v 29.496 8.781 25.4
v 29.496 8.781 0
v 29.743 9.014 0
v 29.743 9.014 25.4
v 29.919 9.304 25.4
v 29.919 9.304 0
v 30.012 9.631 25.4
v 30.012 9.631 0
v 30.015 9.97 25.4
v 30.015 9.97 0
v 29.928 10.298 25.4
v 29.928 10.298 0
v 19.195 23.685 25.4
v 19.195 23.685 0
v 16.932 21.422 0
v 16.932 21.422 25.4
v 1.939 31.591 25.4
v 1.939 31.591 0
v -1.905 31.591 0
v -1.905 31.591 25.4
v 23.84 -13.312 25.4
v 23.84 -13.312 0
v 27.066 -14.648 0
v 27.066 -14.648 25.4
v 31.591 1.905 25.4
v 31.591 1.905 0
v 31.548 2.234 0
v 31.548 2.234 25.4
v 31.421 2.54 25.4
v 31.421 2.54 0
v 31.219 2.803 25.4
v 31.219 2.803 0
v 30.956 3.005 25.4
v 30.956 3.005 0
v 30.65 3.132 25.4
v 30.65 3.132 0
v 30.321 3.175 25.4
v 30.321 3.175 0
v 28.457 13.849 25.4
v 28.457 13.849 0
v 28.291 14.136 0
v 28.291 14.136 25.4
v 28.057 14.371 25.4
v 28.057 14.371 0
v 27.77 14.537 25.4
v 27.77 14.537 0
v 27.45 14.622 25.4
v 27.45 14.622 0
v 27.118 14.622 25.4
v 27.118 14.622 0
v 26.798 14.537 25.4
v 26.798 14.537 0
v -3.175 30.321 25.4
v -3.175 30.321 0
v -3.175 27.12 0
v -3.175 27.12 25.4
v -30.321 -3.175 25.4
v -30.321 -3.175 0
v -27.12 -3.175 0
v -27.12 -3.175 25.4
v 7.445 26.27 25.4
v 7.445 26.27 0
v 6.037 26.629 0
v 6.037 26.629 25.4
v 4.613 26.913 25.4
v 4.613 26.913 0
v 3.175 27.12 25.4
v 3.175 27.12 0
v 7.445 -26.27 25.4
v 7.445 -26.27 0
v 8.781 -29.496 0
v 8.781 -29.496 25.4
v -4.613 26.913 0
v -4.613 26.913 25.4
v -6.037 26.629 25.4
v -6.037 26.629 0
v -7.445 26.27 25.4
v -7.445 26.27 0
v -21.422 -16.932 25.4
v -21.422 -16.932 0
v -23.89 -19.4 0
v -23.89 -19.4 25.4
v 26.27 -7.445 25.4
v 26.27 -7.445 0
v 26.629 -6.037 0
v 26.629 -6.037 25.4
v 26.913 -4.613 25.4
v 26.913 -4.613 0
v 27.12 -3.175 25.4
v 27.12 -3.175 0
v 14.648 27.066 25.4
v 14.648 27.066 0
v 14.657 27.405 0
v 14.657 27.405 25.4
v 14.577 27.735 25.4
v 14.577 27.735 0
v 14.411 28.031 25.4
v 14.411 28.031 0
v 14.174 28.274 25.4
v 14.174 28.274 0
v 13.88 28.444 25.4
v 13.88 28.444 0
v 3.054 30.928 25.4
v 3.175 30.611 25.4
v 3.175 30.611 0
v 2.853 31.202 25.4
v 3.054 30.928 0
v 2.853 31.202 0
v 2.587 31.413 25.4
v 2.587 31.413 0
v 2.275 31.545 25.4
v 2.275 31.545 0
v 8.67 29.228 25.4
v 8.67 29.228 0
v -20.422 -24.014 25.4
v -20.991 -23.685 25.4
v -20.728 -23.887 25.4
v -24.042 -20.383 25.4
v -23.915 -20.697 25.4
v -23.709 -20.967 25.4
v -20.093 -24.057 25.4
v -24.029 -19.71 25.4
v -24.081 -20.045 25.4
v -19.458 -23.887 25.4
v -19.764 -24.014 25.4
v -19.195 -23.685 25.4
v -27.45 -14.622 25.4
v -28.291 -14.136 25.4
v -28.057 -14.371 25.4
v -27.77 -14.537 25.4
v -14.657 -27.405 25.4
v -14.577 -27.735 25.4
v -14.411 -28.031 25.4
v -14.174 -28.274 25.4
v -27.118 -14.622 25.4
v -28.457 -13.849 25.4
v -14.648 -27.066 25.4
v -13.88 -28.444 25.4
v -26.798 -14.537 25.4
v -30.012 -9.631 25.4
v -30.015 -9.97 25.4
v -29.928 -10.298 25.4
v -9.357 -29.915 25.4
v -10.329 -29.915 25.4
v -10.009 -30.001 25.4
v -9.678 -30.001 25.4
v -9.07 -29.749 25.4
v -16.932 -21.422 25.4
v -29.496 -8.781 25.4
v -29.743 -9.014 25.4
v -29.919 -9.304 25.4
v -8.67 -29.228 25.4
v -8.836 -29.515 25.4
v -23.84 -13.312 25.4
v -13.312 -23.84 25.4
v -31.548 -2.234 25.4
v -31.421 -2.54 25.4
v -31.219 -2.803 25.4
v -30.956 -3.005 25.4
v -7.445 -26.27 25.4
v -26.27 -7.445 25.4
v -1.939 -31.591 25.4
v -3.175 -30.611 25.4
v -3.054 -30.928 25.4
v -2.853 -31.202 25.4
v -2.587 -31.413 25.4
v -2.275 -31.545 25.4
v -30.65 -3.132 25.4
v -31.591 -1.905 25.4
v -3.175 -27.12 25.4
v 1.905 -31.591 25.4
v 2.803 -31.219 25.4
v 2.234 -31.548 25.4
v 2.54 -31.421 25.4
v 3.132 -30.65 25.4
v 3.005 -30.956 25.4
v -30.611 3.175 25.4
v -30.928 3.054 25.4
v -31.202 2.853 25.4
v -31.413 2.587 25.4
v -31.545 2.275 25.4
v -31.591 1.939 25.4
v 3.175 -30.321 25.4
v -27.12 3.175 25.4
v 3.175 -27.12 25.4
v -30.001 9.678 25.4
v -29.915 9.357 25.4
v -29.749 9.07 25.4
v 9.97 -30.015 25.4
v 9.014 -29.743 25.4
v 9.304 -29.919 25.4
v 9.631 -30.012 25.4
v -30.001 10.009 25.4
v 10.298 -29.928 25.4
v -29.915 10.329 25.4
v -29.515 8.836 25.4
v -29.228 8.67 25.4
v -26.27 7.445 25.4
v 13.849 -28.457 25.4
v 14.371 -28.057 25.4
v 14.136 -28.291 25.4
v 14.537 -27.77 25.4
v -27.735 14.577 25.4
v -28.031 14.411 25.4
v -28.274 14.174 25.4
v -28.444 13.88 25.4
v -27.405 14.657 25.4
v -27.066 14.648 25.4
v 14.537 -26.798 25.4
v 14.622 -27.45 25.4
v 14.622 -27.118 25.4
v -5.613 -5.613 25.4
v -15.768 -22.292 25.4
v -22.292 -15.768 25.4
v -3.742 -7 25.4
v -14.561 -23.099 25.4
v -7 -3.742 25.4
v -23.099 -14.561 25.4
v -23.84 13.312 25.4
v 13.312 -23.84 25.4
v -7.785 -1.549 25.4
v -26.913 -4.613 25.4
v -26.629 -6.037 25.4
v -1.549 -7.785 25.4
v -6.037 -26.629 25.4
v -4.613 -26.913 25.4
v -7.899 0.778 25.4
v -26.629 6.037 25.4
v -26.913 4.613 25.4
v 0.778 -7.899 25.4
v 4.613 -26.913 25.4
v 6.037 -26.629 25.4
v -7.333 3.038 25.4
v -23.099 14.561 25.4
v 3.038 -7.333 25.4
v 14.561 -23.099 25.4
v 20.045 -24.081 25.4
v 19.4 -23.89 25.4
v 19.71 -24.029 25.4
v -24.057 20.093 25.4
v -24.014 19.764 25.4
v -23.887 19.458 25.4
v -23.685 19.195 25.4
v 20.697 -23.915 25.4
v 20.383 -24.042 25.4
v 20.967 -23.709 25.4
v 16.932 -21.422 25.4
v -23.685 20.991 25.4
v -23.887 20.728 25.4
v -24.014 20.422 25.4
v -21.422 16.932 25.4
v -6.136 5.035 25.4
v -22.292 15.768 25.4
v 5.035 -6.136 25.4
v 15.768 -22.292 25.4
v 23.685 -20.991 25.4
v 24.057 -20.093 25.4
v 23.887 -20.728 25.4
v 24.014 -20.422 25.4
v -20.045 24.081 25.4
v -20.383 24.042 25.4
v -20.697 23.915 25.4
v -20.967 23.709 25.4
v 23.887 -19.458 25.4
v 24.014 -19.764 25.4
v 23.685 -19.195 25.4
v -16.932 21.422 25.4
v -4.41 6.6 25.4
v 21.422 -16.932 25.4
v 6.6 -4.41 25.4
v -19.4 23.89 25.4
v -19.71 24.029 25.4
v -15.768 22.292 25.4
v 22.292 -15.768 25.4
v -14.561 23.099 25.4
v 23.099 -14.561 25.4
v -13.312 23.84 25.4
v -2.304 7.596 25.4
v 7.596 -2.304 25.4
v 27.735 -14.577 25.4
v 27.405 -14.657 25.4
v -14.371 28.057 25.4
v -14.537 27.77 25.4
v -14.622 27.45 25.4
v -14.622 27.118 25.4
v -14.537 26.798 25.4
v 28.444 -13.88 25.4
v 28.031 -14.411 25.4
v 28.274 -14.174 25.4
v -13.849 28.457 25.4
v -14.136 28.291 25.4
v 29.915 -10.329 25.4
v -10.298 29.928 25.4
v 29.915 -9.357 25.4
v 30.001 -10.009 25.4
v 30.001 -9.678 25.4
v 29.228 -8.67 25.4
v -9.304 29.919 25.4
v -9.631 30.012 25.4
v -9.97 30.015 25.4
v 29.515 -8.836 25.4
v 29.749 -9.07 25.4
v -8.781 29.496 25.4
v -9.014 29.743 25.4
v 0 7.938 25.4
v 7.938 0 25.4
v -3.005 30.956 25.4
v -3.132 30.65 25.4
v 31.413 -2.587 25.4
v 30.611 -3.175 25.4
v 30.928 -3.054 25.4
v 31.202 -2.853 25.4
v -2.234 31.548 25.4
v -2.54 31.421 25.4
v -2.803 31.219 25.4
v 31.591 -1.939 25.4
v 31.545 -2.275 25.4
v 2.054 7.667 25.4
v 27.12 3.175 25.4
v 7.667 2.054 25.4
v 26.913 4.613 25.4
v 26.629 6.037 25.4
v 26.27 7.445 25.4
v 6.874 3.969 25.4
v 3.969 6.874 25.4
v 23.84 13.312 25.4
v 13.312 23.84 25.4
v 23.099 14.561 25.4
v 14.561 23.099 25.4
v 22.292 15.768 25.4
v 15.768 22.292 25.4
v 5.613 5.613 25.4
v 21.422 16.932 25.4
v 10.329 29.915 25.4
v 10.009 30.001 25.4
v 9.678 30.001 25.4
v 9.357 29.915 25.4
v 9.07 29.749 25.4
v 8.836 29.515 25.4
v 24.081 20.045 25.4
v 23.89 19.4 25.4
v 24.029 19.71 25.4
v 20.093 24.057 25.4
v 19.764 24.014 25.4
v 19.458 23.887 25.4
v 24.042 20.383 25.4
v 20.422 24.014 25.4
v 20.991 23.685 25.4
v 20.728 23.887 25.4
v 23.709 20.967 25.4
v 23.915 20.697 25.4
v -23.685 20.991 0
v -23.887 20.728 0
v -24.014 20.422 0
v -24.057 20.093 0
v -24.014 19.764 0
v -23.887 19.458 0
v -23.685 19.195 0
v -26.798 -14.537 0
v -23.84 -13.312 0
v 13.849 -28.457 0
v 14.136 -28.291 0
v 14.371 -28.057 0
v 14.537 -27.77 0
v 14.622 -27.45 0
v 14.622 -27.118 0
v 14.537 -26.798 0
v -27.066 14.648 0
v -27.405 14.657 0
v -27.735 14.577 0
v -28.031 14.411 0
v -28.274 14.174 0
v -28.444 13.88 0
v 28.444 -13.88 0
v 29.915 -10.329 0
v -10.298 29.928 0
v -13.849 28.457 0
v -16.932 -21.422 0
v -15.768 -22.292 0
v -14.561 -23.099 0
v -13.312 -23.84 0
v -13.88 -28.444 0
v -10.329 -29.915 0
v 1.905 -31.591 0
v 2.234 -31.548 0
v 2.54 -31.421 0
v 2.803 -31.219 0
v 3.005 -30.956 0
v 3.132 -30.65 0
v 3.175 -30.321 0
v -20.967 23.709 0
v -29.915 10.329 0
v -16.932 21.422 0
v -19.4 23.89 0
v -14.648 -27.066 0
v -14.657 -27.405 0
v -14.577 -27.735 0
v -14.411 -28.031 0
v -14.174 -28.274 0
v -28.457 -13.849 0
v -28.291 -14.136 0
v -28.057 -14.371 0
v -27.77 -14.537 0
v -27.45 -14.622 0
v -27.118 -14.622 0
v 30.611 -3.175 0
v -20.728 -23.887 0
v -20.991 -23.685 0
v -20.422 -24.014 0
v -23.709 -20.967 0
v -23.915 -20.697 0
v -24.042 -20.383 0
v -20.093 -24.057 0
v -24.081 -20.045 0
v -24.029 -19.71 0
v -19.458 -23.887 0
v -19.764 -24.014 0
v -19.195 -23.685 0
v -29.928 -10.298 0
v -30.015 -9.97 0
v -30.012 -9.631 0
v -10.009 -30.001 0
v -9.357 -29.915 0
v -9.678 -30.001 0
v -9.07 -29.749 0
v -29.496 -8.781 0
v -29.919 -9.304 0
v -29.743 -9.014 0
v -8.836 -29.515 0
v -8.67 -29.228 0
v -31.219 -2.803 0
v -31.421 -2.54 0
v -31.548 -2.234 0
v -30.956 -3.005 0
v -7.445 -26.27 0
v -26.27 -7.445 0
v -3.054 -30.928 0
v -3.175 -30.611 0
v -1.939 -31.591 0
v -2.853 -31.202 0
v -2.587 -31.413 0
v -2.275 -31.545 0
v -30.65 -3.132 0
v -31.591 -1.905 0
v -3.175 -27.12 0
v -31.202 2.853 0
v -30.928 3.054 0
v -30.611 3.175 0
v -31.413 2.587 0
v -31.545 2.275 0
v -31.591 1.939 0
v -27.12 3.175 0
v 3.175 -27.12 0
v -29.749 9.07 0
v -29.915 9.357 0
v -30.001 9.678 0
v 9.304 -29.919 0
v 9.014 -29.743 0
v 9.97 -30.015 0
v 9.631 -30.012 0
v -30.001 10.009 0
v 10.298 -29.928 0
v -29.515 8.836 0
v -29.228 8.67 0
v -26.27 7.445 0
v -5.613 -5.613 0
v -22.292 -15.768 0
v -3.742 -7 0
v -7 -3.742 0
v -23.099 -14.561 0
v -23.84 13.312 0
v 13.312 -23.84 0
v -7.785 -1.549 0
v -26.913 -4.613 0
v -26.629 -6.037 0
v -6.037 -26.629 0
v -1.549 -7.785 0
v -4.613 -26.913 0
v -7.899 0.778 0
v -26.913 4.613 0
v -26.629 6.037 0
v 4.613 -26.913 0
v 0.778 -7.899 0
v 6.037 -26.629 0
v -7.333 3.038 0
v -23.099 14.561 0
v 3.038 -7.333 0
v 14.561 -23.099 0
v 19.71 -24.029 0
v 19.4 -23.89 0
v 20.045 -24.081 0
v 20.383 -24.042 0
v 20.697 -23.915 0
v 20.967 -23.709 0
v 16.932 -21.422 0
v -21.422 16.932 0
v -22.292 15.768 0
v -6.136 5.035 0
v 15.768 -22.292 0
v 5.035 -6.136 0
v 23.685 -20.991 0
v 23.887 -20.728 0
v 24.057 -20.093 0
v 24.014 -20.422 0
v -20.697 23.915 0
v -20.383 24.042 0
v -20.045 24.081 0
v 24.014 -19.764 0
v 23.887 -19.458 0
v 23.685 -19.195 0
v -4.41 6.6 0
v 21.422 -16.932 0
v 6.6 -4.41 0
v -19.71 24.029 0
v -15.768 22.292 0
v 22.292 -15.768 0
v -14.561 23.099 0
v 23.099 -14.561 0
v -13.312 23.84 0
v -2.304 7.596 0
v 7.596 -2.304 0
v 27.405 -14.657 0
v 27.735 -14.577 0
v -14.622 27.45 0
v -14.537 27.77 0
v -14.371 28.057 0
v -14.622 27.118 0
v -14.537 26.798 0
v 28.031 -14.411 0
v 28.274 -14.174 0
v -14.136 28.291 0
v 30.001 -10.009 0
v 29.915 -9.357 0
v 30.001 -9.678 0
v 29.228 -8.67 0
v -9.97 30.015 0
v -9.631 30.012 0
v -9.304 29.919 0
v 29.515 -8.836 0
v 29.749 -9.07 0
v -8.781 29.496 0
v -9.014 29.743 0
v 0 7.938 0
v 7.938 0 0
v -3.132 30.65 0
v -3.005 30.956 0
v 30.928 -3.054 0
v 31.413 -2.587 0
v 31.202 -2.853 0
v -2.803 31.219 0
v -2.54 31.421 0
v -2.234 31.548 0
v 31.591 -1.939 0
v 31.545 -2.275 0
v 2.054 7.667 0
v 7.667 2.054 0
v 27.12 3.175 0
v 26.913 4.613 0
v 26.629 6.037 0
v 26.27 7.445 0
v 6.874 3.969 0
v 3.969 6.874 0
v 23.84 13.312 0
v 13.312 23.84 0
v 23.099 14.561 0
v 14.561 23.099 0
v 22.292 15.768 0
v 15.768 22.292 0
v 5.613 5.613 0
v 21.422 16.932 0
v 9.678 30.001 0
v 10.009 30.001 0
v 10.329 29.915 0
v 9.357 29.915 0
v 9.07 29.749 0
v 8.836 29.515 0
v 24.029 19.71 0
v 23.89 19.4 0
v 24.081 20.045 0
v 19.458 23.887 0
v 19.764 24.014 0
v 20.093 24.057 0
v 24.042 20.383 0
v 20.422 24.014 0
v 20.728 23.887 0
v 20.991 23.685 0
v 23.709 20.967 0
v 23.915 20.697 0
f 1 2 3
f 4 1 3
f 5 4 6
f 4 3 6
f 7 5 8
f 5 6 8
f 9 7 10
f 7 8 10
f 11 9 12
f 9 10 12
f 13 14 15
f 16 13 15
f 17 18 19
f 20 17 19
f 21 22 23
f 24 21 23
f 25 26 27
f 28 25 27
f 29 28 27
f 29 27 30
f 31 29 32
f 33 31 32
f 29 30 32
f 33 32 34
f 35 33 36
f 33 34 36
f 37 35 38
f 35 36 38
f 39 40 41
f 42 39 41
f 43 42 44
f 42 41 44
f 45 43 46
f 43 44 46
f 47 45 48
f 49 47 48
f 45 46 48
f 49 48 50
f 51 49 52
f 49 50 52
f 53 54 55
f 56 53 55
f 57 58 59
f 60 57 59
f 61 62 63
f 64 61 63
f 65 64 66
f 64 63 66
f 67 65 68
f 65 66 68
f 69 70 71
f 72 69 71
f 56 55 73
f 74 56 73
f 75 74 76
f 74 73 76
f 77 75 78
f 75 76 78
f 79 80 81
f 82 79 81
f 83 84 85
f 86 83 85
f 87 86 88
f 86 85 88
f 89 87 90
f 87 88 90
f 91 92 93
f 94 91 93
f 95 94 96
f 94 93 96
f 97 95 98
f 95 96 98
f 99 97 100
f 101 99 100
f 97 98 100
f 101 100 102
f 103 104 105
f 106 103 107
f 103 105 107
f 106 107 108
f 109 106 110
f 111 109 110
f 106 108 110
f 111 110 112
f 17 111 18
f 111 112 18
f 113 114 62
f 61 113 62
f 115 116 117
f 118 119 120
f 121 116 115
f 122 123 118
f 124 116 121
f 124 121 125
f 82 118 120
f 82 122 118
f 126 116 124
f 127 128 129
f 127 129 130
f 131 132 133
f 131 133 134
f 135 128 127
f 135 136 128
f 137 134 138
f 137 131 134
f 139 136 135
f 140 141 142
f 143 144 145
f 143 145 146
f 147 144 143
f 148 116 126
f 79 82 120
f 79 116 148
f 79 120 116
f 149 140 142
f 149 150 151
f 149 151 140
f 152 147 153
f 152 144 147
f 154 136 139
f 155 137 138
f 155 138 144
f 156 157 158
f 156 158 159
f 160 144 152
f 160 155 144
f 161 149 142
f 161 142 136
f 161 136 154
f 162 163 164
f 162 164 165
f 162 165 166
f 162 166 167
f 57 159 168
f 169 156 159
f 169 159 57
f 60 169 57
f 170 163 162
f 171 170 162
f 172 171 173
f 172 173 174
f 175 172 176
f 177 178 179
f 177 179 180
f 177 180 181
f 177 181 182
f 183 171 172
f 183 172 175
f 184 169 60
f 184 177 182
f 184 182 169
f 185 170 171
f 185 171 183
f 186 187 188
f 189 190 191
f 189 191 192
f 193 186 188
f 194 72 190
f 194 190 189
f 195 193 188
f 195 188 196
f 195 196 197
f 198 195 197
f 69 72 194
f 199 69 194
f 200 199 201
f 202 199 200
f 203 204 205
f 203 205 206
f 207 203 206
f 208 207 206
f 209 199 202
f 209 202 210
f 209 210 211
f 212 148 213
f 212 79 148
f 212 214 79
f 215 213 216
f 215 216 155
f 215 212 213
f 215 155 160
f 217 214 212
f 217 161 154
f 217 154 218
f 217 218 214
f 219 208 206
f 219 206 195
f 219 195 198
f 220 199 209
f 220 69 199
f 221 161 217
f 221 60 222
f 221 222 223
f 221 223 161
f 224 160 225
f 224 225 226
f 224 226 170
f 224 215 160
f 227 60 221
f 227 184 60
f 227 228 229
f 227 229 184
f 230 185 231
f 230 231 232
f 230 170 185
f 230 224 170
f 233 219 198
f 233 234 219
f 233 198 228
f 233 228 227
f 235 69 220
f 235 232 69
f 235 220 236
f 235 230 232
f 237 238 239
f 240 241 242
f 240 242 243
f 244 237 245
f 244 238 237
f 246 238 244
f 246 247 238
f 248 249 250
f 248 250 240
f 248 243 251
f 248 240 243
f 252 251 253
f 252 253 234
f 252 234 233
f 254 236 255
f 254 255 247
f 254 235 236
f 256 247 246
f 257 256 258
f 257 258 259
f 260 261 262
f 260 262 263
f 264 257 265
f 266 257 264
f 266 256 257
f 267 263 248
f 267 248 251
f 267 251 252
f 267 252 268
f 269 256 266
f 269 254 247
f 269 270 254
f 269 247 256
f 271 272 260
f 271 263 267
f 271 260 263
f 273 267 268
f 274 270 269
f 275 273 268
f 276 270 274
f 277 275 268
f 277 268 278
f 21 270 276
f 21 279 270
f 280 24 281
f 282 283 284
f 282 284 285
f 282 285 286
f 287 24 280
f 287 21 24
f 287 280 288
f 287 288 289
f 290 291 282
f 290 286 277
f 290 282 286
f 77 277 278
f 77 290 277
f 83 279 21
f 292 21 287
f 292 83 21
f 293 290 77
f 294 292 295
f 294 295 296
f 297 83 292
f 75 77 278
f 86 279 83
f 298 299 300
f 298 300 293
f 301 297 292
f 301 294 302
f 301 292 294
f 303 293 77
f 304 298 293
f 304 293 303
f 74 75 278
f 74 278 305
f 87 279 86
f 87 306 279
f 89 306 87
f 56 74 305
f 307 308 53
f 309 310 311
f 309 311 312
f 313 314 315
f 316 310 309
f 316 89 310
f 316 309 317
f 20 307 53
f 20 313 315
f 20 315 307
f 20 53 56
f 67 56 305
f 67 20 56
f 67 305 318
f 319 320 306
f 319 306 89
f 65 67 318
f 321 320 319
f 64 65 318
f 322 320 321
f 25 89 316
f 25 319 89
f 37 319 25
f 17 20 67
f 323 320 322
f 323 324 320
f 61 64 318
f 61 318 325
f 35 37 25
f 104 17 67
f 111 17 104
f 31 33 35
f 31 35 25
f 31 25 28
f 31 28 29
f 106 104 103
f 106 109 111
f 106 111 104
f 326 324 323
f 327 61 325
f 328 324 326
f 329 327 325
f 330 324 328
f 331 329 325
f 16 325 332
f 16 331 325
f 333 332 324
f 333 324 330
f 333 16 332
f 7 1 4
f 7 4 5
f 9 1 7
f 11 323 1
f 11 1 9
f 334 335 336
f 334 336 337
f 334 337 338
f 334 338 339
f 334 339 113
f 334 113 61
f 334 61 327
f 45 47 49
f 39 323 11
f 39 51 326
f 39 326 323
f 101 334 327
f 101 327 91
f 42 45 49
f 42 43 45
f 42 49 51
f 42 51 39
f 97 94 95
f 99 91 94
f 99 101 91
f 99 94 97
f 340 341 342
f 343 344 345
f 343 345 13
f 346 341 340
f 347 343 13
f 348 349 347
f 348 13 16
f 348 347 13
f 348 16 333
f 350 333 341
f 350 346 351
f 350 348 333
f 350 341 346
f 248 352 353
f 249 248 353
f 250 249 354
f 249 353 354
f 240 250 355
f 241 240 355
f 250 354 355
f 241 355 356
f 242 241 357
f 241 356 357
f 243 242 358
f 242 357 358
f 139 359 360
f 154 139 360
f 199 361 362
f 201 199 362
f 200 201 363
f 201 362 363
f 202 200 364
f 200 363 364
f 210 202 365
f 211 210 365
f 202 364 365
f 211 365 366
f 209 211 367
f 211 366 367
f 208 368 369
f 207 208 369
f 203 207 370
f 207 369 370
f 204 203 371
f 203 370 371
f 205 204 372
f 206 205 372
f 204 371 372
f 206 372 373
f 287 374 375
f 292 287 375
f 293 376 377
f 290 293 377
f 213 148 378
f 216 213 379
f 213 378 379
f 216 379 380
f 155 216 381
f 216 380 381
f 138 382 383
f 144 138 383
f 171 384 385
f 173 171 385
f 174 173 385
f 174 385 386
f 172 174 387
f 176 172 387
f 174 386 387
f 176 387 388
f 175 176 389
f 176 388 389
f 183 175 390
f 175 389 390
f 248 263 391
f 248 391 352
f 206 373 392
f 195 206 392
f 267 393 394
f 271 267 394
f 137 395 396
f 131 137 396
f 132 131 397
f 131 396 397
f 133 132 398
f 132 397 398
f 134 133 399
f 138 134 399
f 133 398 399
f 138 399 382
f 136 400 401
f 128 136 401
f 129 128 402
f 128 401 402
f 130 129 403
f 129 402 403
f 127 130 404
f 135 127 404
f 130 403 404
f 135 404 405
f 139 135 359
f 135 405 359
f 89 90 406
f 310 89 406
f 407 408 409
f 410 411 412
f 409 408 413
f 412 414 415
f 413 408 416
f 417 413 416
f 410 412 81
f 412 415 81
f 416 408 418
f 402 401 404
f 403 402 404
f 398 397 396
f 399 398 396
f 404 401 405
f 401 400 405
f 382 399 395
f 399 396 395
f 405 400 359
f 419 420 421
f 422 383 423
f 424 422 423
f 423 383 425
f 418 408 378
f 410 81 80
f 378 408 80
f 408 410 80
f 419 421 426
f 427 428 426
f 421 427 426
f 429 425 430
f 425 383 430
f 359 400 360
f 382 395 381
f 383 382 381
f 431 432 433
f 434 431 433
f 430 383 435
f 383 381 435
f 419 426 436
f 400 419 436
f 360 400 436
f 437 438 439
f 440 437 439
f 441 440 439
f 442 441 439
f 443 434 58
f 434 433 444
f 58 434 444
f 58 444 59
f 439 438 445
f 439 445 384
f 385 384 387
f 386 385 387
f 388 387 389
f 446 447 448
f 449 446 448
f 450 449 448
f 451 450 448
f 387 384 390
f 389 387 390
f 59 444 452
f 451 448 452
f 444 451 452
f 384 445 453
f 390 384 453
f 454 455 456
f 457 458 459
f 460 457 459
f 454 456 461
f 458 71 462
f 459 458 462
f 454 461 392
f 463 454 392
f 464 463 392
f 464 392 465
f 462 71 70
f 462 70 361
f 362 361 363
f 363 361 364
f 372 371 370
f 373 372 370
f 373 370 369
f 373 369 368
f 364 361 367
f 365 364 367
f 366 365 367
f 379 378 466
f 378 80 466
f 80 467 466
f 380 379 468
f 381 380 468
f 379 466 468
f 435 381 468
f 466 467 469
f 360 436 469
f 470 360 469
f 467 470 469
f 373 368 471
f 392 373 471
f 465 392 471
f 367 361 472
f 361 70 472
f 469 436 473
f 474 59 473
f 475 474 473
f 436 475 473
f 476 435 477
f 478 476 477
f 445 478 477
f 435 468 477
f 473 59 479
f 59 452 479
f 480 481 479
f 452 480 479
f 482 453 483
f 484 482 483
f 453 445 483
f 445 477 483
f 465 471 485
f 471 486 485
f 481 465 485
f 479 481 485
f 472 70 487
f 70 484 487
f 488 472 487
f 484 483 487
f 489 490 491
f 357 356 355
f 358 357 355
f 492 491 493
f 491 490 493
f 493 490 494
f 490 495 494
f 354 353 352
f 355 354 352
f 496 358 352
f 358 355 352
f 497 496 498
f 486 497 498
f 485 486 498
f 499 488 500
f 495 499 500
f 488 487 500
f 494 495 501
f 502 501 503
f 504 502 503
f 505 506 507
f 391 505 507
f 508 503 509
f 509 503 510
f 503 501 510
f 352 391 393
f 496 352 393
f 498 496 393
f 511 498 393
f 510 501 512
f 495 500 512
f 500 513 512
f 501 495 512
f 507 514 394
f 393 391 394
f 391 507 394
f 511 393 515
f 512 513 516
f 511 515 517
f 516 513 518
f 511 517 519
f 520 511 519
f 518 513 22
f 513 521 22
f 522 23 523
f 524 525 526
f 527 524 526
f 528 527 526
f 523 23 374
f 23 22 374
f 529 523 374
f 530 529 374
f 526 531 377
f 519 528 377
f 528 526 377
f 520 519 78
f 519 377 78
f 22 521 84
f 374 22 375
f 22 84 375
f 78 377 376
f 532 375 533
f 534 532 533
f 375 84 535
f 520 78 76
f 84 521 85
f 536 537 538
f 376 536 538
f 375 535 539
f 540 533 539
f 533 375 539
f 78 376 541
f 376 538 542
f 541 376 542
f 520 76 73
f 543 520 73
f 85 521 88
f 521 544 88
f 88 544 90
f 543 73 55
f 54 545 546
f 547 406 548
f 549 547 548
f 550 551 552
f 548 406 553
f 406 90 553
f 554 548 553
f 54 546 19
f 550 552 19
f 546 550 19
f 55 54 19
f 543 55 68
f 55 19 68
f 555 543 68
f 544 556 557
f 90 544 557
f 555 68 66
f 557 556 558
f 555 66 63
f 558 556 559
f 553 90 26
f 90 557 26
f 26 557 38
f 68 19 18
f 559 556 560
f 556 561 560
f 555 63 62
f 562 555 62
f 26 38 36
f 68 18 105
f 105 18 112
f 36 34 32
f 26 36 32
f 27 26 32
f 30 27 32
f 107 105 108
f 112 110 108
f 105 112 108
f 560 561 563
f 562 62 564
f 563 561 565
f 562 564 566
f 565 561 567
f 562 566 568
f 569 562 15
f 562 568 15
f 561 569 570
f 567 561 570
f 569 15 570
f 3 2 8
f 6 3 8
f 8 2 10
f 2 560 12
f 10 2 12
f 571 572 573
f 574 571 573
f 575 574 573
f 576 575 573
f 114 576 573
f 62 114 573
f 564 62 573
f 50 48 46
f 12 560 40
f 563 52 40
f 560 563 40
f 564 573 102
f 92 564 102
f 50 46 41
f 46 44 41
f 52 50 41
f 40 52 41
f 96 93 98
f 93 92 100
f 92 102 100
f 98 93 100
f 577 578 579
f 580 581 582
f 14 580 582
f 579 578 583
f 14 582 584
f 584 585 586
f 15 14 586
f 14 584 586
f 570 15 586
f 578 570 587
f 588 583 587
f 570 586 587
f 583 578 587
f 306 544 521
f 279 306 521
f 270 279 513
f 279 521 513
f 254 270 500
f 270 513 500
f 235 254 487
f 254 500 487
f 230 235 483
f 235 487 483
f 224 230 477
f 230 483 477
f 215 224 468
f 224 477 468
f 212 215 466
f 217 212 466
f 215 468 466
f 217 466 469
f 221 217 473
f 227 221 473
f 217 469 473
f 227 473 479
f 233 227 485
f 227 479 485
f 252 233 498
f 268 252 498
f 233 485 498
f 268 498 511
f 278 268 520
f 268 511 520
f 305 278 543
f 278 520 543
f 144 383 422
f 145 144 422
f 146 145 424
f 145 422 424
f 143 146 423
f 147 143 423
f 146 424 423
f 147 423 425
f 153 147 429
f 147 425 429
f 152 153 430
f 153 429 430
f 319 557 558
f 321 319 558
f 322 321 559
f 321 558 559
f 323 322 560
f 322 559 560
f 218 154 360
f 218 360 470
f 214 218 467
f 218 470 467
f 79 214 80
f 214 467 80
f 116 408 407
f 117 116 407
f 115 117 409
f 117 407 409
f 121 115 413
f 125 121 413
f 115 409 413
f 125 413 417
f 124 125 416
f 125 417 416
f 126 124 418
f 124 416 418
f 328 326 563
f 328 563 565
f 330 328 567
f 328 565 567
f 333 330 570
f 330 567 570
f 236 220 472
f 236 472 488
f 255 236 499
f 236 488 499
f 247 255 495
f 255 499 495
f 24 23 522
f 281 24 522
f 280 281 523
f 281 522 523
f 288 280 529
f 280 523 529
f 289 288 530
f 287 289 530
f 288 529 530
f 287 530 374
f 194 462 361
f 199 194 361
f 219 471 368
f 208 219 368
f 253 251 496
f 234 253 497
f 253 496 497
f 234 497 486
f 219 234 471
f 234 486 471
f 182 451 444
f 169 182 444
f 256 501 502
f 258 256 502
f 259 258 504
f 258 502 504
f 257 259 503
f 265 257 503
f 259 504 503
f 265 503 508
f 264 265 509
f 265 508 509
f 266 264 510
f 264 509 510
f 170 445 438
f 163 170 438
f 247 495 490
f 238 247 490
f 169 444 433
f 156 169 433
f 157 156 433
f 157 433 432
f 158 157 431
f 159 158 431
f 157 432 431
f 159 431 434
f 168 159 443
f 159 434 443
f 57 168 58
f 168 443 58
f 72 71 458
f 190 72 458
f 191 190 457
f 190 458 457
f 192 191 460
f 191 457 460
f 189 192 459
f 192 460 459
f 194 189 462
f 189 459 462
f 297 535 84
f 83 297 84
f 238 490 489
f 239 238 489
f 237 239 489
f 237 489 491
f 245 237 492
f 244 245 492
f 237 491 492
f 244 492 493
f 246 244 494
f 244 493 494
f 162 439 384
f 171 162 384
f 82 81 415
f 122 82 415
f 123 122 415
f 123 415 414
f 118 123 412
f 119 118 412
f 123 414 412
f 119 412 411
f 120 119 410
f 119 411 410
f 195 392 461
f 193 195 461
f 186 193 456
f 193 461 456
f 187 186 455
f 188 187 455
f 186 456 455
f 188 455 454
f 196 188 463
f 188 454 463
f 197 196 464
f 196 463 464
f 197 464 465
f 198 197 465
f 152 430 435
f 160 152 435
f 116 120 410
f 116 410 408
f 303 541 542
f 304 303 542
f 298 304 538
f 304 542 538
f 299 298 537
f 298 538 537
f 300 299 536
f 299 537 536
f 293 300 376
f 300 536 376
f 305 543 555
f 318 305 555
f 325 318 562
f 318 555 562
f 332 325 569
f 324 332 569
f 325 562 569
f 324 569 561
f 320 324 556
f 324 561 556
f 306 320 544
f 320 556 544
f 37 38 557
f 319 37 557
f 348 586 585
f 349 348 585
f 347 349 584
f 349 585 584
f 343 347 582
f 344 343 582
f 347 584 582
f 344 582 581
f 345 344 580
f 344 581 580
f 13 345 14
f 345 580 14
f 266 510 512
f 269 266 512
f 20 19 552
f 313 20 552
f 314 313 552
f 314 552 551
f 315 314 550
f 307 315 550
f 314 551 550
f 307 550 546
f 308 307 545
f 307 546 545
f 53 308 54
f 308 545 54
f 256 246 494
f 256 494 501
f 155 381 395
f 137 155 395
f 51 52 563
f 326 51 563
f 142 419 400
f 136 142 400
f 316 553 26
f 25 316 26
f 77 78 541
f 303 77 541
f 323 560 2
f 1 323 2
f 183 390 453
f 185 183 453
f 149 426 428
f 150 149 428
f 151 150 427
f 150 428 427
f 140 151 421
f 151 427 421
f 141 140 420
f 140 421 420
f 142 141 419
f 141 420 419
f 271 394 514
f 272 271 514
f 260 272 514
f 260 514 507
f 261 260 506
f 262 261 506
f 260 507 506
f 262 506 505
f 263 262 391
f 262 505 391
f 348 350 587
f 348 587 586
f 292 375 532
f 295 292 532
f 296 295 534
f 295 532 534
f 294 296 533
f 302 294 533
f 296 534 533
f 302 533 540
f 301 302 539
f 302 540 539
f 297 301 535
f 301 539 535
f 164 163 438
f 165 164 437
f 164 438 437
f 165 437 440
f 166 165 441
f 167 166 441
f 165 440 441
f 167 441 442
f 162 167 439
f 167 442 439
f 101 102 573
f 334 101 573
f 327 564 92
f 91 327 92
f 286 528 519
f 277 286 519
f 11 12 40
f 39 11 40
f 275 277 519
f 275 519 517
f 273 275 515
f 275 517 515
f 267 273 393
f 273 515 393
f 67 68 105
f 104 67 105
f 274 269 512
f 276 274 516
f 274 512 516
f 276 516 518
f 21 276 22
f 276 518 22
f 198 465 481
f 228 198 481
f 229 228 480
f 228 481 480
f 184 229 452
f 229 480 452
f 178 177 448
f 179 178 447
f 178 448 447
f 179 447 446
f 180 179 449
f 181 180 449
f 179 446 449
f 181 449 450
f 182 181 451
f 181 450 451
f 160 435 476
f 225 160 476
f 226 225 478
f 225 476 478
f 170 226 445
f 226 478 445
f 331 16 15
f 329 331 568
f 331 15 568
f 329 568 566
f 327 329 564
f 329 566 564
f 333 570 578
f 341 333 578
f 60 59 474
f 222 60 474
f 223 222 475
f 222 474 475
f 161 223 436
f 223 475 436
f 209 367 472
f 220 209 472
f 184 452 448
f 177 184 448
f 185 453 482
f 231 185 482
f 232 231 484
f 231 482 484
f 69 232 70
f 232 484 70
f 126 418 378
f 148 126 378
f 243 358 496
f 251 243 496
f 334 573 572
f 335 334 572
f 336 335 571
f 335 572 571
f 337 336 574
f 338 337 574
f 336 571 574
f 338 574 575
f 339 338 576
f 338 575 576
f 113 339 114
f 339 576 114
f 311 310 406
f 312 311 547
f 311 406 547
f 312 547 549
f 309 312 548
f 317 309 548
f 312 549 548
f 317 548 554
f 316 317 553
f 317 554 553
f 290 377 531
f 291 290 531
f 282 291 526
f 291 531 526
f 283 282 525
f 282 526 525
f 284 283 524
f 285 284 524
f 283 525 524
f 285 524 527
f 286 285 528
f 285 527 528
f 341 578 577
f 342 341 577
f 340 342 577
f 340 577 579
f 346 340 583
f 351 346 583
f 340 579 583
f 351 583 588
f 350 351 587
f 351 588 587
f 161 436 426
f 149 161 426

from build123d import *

# Parameters (mm, degrees)
F1_DEPTH = 25.4


with BuildPart() as f1:
    # F0 (on Top) → F1 (new body)
    with BuildSketch(Plane.XY):
        with BuildLine():
            ThreePointArc((3.175, 27.119779), (1.590199, 27.258655), (0, 27.305))
            ThreePointArc((0, 27.305), (-1.590199, 27.258655), (-3.175, 27.119779))
            ThreePointArc((-3.175, 27.119779), (-5.326941, 26.780342), (-7.444973, 26.270428))
            ThreePointArc((-7.444973, 26.270428), (-10.449171, 25.226531), (-13.311608, 23.840389))
            ThreePointArc((-13.311608, 23.840389), (-15.169845, 22.703278), (-16.931515, 21.421643))
            ThreePointArc((-16.931515, 21.421643), (-19.307551, 19.307551), (-21.421643, 16.931515))
            ThreePointArc((-21.421643, 16.931515), (-22.703278, 15.169845), (-23.840389, 13.311608))
            ThreePointArc((-23.840389, 13.311608), (-25.226531, 10.449171), (-26.270428, 7.444973))
            ThreePointArc((-26.270428, 7.444973), (-26.780342, 5.326941), (-27.119779, 3.175))
            ThreePointArc((-27.119779, 3.175), (-27.305, 0), (-27.119779, -3.175))
            ThreePointArc((-27.119779, -3.175), (-26.780342, -5.326941), (-26.270428, -7.444973))
            ThreePointArc((-26.270428, -7.444973), (-25.226531, -10.449171), (-23.840389, -13.311608))
            ThreePointArc((-23.840389, -13.311608), (-22.703278, -15.169845), (-21.421643, -16.931515))
            ThreePointArc((-21.421643, -16.931515), (-19.307551, -19.307551), (-16.931515, -21.421643))
            ThreePointArc((-16.931515, -21.421643), (-15.169845, -22.703278), (-13.311608, -23.840389))
            ThreePointArc((-13.311608, -23.840389), (-10.449171, -25.226531), (-7.444973, -26.270428))
            ThreePointArc((-7.444973, -26.270428), (-5.326941, -26.780342), (-3.175, -27.119779))
            ThreePointArc((-3.175, -27.119779), (0, -27.305), (3.175, -27.119779))
            ThreePointArc((3.175, -27.119779), (5.326941, -26.780342), (7.444973, -26.270428))
            ThreePointArc((7.444973, -26.270428), (10.449171, -25.226531), (13.311608, -23.840389))
            ThreePointArc((13.311608, -23.840389), (15.169845, -22.703278), (16.931515, -21.421643))
            ThreePointArc((16.931515, -21.421643), (19.307551, -19.307551), (21.421643, -16.931515))
            ThreePointArc((21.421643, -16.931515), (22.703278, -15.169845), (23.840389, -13.311608))
            ThreePointArc((23.840389, -13.311608), (25.226531, -10.449171), (26.270428, -7.444973))
            ThreePointArc((26.270428, -7.444973), (26.780342, -5.326941), (27.119779, -3.175))
            ThreePointArc((27.119779, -3.175), (27.258655, -1.590199), (27.305, 0))
            ThreePointArc((27.305, 0), (27.258655, 1.590199), (27.119779, 3.175))
            ThreePointArc((27.119779, 3.175), (26.780342, 5.326941), (26.270428, 7.444973))
            ThreePointArc((26.270428, 7.444973), (25.226531, 10.449171), (23.840389, 13.311608))
            ThreePointArc((23.840389, 13.311608), (22.703278, 15.169845), (21.421643, 16.931515))
            ThreePointArc((21.421643, 16.931515), (19.307551, 19.307551), (16.931515, 21.421643))
            ThreePointArc((16.931515, 21.421643), (15.169845, 22.703278), (13.311608, 23.840389))
            ThreePointArc((13.311608, 23.840389), (10.449171, 25.226531), (7.444973, 26.270428))
            ThreePointArc((7.444973, 26.270428), (5.326941, 26.780342), (3.175, 27.119779))
        make_face()
        with BuildLine():
            ThreePointArc((7.9375, 0), (-5.61266, -5.61266), (0, 7.9375))
            ThreePointArc((0, 7.9375), (5.61266, 5.61266), (7.9375, 0))
        make_face(mode=Mode.SUBTRACT)
        with BuildLine():
            ThreePointArc((-13.311608, 23.840389), (-10.449171, 25.226531), (-7.444973, 26.270428))
            Line((-7.444973, 26.270428), (-8.780969, 29.49581))
            ThreePointArc((-8.780969, 29.49581), (-9.464382, 29.976089), (-10.298293, 29.927998))
            Line((-10.298293, 29.927998), (-13.849286, 28.457129))
            ThreePointArc((-13.849286, 28.457129), (-14.536605, 27.76981), (-14.536605, 26.797794))
            Line((-14.536605, 26.797794), (-13.311608, 23.840389))
        make_face()
        with BuildLine():
            ThreePointArc((-21.421643, 16.931515), (-19.307551, 19.307551), (-16.931515, 21.421643))
            Line((-16.931515, 21.421643), (-19.400115, 23.890243))
            ThreePointArc((-19.400115, 23.890243), (-20.215301, 24.072433), (-20.967332, 23.708879))
            Line((-20.967332, 23.708879), (-23.685143, 20.991067))
            ThreePointArc((-23.685143, 20.991067), (-24.057118, 20.093041), (-23.685143, 19.195015))
            Line((-23.685143, 19.195015), (-21.421643, 16.931515))
        make_face()
        with BuildLine():
            ThreePointArc((-26.270428, 7.444973), (-25.226531, 10.449171), (-23.840389, 13.311608))
            Line((-23.840389, 13.311608), (-27.06577, 14.647604))
            ThreePointArc((-27.06577, 14.647604), (-27.888625, 14.503968), (-28.444284, 13.880297))
            Line((-28.444284, 13.880297), (-29.915153, 10.329305))
            ThreePointArc((-29.915153, 10.329305), (-29.915153, 9.357289), (-29.227834, 8.66997))
            Line((-29.227834, 8.66997), (-26.270428, 7.444973))
        make_face()
        with BuildLine():
            ThreePointArc((-27.119779, -3.175), (-27.305, 0), (-27.119779, 3.175))
            Line((-27.119779, 3.175), (-30.610906, 3.175))
            ThreePointArc((-30.610906, 3.175), (-31.316158, 2.727404), (-31.590851, 1.938566))
            Line((-31.590851, 1.938566), (-31.590851, -1.905))
            ThreePointArc((-31.590851, -1.905), (-31.218877, -2.803026), (-30.320851, -3.175))
            Line((-30.320851, -3.175), (-27.119779, -3.175))
        make_face()
        with BuildLine():
            ThreePointArc((-23.840389, -13.311608), (-25.226531, -10.449171), (-26.270428, -7.444973))
            Line((-26.270428, -7.444973), (-29.49581, -8.780969))
            ThreePointArc((-29.49581, -8.780969), (-29.976089, -9.464382), (-29.927998, -10.298293))
            Line((-29.927998, -10.298293), (-28.457129, -13.849286))
            ThreePointArc((-28.457129, -13.849286), (-27.76981, -14.536605), (-26.797794, -14.536605))
            Line((-26.797794, -14.536605), (-23.840389, -13.311608))
        make_face()
        with BuildLine():
            ThreePointArc((-16.931515, -21.421643), (-19.307551, -19.307551), (-21.421643, -16.931515))
            Line((-21.421643, -16.931515), (-23.890243, -19.400115))
            ThreePointArc((-23.890243, -19.400115), (-24.072433, -20.215301), (-23.708879, -20.967332))
            Line((-23.708879, -20.967332), (-20.991067, -23.685143))
            ThreePointArc((-20.991067, -23.685143), (-20.093041, -24.057118), (-19.195015, -23.685143))
            Line((-19.195015, -23.685143), (-16.931515, -21.421643))
        make_face()
        with BuildLine():
            ThreePointArc((-7.444973, -26.270428), (-10.449171, -25.226531), (-13.311608, -23.840389))
            Line((-13.311608, -23.840389), (-14.647604, -27.06577))
            ThreePointArc((-14.647604, -27.06577), (-14.503968, -27.888625), (-13.880297, -28.444284))
            Line((-13.880297, -28.444284), (-10.329305, -29.915153))
            ThreePointArc((-10.329305, -29.915153), (-9.357289, -29.915153), (-8.66997, -29.227834))
            Line((-8.66997, -29.227834), (-7.444973, -26.270428))
        make_face()
        with BuildLine():
            ThreePointArc((3.175, -27.119779), (0, -27.305), (-3.175, -27.119779))
            Line((-3.175, -27.119779), (-3.175, -30.610906))
            ThreePointArc((-3.175, -30.610906), (-2.727404, -31.316158), (-1.938566, -31.590851))
            Line((-1.938566, -31.590851), (1.905, -31.590851))
            ThreePointArc((1.905, -31.590851), (2.803026, -31.218877), (3.175, -30.320851))
            Line((3.175, -30.320851), (3.175, -27.119779))
        make_face()
        with BuildLine():
            Line((14.536605, -26.797794), (13.311608, -23.840389))
            ThreePointArc((13.311608, -23.840389), (10.449171, -25.226531), (7.444973, -26.270428))
            Line((7.444973, -26.270428), (8.780969, -29.49581))
            ThreePointArc((8.780969, -29.49581), (9.464382, -29.976089), (10.298293, -29.927998))
            Line((10.298293, -29.927998), (13.849286, -28.457129))
            ThreePointArc((13.849286, -28.457129), (14.536605, -27.76981), (14.536605, -26.797794))
        make_face()
        with BuildLine():
            Line((23.685143, -19.195015), (21.421643, -16.931515))
            ThreePointArc((21.421643, -16.931515), (19.307551, -19.307551), (16.931515, -21.421643))
            Line((16.931515, -21.421643), (19.400115, -23.890243))
            ThreePointArc((19.400115, -23.890243), (20.215301, -24.072433), (20.967332, -23.708879))
            Line((20.967332, -23.708879), (23.685143, -20.991067))
            ThreePointArc((23.685143, -20.991067), (24.057118, -20.093041), (23.685143, -19.195015))
        make_face()
        with BuildLine():
            Line((29.227834, -8.66997), (26.270428, -7.444973))
            ThreePointArc((26.270428, -7.444973), (25.226531, -10.449171), (23.840389, -13.311608))
            Line((23.840389, -13.311608), (27.06577, -14.647604))
            ThreePointArc((27.06577, -14.647604), (27.888625, -14.503968), (28.444284, -13.880297))
            Line((28.444284, -13.880297), (29.915153, -10.329305))
            ThreePointArc((29.915153, -10.329305), (29.915153, -9.357289), (29.227834, -8.66997))
        make_face()
        with BuildLine():
            Line((30.320851, 3.175), (27.119779, 3.175))
            ThreePointArc((27.119779, 3.175), (27.258655, 1.590199), (27.305, 0))
            ThreePointArc((27.305, 0), (27.258655, -1.590199), (27.119779, -3.175))
            Line((27.119779, -3.175), (30.610906, -3.175))
            ThreePointArc((30.610906, -3.175), (31.316158, -2.727404), (31.590851, -1.938566))
            Line((31.590851, -1.938566), (31.590851, 1.905))
            ThreePointArc((31.590851, 1.905), (31.218877, 2.803026), (30.320851, 3.175))
        make_face()
        with BuildLine():
            Line((26.797794, 14.536605), (23.840389, 13.311608))
            ThreePointArc((23.840389, 13.311608), (25.226531, 10.449171), (26.270428, 7.444973))
            Line((26.270428, 7.444973), (29.49581, 8.780969))
            ThreePointArc((29.49581, 8.780969), (29.976089, 9.464382), (29.927998, 10.298293))
            Line((29.927998, 10.298293), (28.457129, 13.849286))
            ThreePointArc((28.457129, 13.849286), (27.76981, 14.536605), (26.797794, 14.536605))
        make_face()
        with BuildLine():
            Line((19.195015, 23.685143), (16.931515, 21.421643))
            ThreePointArc((16.931515, 21.421643), (19.307551, 19.307551), (21.421643, 16.931515))
            Line((21.421643, 16.931515), (23.890243, 19.400115))
            ThreePointArc((23.890243, 19.400115), (24.072433, 20.215301), (23.708879, 20.967332))
            Line((23.708879, 20.967332), (20.991067, 23.685143))
            ThreePointArc((20.991067, 23.685143), (20.093041, 24.057118), (19.195015, 23.685143))
        make_face()
        with BuildLine():
            Line((8.66997, 29.227834), (7.444973, 26.270428))
            ThreePointArc((7.444973, 26.270428), (10.449171, 25.226531), (13.311608, 23.840389))
            Line((13.311608, 23.840389), (14.647604, 27.06577))
            ThreePointArc((14.647604, 27.06577), (14.503968, 27.888625), (13.880297, 28.444284))
            Line((13.880297, 28.444284), (10.329305, 29.915153))
            ThreePointArc((10.329305, 29.915153), (9.357289, 29.915153), (8.66997, 29.227834))
        make_face()
        with BuildLine():
            Line((1.938566, 31.590851), (0, 31.590851))
            Line((0, 31.590851), (0, 27.305))
            ThreePointArc((0, 27.305), (1.590199, 27.258655), (3.175, 27.119779))
            Line((3.175, 27.119779), (3.175, 30.610906))
            ThreePointArc((3.175, 30.610906), (2.727404, 31.316158), (1.938566, 31.590851))
        make_face()
        with BuildLine():
            Line((0, 27.305), (0, 31.590851))
            Line((0, 31.590851), (-1.905, 31.590851))
            ThreePointArc((-1.905, 31.590851), (-2.803026, 31.218877), (-3.175, 30.320851))
            Line((-3.175, 30.320851), (-3.175, 27.119779))
            ThreePointArc((-3.175, 27.119779), (-1.590199, 27.258655), (0, 27.305))
        make_face()
    extrude(amount=F1_DEPTH)


solid = f1.part
